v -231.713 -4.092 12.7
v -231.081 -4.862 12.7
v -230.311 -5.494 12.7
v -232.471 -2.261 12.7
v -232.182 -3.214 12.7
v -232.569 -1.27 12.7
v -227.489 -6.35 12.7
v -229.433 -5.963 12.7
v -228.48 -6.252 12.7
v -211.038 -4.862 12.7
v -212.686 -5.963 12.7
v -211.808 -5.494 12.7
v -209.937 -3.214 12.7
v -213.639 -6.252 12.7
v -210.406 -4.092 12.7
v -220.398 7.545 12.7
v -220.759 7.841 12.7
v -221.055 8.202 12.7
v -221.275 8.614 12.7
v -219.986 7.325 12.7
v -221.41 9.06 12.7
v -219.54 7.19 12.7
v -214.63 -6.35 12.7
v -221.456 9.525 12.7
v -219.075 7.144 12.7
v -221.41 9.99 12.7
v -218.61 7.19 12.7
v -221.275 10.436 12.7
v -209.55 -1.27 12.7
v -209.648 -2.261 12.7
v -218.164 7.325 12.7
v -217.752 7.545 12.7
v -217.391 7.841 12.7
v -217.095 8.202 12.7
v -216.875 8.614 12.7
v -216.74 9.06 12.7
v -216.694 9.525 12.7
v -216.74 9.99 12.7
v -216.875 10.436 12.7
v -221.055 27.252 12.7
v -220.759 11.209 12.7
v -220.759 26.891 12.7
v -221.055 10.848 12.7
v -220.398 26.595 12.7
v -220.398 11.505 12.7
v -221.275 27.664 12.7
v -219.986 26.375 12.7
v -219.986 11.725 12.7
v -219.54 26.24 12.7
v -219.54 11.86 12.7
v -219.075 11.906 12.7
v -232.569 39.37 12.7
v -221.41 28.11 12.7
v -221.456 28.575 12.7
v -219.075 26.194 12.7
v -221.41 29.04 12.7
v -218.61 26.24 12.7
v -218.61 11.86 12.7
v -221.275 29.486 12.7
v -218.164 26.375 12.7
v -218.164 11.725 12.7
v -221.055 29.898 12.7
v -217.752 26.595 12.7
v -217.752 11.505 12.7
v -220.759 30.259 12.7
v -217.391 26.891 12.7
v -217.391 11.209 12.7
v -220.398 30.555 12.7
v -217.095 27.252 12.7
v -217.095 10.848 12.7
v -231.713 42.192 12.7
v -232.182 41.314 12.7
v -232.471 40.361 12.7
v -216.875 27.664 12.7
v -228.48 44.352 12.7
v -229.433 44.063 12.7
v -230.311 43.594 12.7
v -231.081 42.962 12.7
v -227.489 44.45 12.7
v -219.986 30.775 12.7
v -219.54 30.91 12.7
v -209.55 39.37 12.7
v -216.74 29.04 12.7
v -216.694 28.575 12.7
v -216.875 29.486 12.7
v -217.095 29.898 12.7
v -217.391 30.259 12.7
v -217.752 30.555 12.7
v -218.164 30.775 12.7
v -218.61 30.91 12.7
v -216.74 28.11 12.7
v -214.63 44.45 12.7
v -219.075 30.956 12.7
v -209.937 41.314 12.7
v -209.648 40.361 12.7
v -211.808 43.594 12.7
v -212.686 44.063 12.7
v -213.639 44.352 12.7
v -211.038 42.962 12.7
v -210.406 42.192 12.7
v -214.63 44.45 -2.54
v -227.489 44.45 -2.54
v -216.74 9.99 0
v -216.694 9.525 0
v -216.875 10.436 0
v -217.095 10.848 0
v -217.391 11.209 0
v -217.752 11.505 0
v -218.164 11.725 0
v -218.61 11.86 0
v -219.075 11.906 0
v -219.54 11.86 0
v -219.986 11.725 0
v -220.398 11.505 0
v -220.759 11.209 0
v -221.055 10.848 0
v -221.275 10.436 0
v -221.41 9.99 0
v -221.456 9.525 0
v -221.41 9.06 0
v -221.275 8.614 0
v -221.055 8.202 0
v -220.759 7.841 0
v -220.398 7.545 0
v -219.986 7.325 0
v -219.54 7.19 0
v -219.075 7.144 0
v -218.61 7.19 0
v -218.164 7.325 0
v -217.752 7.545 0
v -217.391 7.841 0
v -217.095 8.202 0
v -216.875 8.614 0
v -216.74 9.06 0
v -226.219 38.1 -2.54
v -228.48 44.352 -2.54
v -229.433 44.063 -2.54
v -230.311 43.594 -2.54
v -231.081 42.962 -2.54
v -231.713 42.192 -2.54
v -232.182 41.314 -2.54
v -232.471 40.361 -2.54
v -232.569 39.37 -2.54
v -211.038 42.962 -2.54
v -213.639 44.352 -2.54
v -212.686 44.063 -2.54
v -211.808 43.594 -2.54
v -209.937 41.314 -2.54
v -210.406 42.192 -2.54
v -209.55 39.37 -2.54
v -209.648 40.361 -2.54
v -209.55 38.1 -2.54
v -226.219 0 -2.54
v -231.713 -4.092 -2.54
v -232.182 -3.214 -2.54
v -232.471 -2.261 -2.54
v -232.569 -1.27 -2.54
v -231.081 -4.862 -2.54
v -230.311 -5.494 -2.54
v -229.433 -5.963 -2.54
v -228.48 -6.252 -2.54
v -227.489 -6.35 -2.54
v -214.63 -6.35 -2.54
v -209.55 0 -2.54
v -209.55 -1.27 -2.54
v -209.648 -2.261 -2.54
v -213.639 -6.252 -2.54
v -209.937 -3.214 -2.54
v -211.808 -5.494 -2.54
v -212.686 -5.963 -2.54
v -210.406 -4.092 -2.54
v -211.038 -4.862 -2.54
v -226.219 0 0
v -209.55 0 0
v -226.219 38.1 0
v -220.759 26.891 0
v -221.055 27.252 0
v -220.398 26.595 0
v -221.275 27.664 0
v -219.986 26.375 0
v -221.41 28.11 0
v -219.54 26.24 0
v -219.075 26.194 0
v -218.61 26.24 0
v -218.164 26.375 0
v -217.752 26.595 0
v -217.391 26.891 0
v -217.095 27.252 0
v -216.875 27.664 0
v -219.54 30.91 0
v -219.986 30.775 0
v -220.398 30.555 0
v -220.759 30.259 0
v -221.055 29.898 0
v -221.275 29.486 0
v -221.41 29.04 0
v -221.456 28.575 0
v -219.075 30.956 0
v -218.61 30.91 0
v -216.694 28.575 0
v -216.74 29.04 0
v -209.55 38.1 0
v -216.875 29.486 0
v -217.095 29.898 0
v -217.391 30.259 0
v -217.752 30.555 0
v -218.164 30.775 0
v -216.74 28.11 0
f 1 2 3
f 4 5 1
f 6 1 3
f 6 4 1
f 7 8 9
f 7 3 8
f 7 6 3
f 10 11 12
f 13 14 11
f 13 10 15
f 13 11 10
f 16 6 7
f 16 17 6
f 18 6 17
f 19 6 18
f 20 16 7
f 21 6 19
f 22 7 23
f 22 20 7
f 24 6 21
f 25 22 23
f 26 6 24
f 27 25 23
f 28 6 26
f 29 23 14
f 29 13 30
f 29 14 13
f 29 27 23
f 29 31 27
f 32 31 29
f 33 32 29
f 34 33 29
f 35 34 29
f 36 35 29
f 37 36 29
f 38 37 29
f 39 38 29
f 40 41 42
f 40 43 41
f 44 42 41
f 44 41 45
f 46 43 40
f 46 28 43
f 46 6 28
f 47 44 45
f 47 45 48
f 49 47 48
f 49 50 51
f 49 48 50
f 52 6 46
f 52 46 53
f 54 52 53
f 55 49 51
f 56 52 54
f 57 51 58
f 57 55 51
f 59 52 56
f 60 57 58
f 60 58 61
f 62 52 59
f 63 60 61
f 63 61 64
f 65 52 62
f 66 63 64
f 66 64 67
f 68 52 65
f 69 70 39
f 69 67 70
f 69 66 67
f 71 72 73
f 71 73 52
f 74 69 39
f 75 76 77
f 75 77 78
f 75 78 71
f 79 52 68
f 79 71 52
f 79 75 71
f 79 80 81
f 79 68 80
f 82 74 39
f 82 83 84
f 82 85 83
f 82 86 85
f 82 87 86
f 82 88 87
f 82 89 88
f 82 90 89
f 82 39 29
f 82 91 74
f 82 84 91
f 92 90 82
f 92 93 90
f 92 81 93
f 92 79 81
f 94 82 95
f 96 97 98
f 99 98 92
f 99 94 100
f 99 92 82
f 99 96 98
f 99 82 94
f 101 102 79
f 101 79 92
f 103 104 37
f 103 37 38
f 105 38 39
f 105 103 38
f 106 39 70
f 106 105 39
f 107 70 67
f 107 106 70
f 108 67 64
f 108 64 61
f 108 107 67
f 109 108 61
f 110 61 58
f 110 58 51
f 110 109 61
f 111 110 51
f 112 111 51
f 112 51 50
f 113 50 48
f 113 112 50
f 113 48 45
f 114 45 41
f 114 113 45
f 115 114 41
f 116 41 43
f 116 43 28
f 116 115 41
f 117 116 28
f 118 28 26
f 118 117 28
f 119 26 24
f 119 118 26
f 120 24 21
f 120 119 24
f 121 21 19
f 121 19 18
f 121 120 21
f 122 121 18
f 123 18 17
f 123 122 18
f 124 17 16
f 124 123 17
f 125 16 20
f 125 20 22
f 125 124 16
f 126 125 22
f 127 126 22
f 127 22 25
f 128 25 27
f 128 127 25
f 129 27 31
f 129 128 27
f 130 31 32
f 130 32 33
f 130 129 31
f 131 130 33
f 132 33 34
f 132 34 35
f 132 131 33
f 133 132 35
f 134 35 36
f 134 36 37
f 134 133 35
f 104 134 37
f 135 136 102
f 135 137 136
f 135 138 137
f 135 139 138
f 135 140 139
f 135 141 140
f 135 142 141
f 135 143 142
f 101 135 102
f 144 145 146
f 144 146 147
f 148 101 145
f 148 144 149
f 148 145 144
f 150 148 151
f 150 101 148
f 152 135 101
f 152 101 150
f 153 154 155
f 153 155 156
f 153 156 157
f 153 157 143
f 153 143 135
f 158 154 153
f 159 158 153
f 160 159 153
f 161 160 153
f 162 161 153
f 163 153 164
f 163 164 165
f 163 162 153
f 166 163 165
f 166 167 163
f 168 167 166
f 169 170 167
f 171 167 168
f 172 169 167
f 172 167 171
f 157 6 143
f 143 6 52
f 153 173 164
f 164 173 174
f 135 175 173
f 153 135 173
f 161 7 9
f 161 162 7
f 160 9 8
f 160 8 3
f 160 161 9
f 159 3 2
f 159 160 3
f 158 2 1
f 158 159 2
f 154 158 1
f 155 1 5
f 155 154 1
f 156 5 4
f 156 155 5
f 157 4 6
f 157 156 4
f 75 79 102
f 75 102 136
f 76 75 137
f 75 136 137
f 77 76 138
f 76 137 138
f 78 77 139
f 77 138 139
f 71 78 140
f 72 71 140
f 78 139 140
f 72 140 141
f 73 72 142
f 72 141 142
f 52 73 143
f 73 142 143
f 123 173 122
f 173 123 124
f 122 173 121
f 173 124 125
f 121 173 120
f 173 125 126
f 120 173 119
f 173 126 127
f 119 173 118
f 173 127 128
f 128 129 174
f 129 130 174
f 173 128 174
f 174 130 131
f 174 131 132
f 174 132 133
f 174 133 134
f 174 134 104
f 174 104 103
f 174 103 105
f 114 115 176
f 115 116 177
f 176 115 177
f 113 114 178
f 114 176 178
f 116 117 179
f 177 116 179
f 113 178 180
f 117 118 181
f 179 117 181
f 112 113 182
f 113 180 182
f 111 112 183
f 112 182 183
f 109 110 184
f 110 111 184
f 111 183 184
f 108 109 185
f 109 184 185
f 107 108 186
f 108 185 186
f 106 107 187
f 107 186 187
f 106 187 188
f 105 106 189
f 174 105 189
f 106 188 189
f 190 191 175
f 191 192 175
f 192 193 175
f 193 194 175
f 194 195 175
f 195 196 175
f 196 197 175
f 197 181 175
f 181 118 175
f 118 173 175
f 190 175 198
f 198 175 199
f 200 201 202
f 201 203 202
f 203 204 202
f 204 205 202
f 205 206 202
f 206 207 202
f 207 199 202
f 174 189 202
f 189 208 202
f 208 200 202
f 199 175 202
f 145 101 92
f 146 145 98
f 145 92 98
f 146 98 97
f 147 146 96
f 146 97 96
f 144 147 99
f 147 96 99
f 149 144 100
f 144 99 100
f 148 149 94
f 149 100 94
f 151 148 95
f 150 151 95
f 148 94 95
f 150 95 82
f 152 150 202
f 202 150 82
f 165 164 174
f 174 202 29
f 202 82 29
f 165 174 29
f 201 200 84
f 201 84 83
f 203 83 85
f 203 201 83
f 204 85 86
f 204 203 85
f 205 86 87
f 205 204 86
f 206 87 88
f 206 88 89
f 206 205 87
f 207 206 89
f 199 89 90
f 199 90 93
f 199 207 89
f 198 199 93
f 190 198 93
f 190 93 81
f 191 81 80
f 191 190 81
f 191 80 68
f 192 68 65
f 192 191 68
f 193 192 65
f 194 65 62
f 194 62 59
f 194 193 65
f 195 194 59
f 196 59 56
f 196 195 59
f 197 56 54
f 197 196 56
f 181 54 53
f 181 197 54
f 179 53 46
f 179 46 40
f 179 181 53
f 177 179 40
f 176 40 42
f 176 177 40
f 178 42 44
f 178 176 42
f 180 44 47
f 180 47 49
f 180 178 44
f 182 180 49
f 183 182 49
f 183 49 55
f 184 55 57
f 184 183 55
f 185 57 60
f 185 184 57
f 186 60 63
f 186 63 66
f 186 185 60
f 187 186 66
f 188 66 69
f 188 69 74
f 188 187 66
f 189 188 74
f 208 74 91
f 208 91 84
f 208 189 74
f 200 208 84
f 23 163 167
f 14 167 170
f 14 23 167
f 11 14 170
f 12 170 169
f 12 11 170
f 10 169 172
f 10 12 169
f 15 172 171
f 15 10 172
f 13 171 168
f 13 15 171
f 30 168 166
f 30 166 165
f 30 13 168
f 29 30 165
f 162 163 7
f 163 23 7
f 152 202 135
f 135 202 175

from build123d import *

# Parameters (mm, degrees)
F1_W     = 23.01875
F1_H     = 50.8
F1_R     = 2.38125
F2_DEPTH = 12.7
F4_DEPTH = 2.54
F5_R     = 5.08


with BuildPart() as f2:
    # F1 (on Top) → F2 (new body)
    with BuildSketch(Plane.XY):
        with Locations((-221.059375, 19.05)):
            Rectangle(F1_W, F1_H)
        with Locations((-219.075, 9.525)):
            Circle(F1_R, mode=Mode.SUBTRACT)
        with Locations((-219.075, 28.575)):
            Circle(F1_R, mode=Mode.SUBTRACT)
    extrude(amount=F2_DEPTH)

    # F3 (on face) → F4 (join)
    with BuildSketch(Plane(origin=(0, 0, 0), x_dir=(1, 0, 0), z_dir=(0, 0, -1))):
        Polygon((-209.55, 6.35), (-232.56875, 6.35), (-232.56875, -44.45), (-209.55, -44.45), (-209.55, -38.1), (-226.21875, -38.1), (-226.21875, 0), (-209.55, 0), align=None)
    extrude(amount=F4_DEPTH)

    # F5
    f5_edges = [f2.edges().sort_by_distance(p)[0] for p in [
        (-209.55, -6.35, 5.08),
        (-232.56875, -6.35, 5.08),
        (-232.56875, 44.45, 5.08),
        (-209.55, 44.45, 5.08),
    ]]
    fillet(f5_edges, radius=F5_R)


solid = f2.part
